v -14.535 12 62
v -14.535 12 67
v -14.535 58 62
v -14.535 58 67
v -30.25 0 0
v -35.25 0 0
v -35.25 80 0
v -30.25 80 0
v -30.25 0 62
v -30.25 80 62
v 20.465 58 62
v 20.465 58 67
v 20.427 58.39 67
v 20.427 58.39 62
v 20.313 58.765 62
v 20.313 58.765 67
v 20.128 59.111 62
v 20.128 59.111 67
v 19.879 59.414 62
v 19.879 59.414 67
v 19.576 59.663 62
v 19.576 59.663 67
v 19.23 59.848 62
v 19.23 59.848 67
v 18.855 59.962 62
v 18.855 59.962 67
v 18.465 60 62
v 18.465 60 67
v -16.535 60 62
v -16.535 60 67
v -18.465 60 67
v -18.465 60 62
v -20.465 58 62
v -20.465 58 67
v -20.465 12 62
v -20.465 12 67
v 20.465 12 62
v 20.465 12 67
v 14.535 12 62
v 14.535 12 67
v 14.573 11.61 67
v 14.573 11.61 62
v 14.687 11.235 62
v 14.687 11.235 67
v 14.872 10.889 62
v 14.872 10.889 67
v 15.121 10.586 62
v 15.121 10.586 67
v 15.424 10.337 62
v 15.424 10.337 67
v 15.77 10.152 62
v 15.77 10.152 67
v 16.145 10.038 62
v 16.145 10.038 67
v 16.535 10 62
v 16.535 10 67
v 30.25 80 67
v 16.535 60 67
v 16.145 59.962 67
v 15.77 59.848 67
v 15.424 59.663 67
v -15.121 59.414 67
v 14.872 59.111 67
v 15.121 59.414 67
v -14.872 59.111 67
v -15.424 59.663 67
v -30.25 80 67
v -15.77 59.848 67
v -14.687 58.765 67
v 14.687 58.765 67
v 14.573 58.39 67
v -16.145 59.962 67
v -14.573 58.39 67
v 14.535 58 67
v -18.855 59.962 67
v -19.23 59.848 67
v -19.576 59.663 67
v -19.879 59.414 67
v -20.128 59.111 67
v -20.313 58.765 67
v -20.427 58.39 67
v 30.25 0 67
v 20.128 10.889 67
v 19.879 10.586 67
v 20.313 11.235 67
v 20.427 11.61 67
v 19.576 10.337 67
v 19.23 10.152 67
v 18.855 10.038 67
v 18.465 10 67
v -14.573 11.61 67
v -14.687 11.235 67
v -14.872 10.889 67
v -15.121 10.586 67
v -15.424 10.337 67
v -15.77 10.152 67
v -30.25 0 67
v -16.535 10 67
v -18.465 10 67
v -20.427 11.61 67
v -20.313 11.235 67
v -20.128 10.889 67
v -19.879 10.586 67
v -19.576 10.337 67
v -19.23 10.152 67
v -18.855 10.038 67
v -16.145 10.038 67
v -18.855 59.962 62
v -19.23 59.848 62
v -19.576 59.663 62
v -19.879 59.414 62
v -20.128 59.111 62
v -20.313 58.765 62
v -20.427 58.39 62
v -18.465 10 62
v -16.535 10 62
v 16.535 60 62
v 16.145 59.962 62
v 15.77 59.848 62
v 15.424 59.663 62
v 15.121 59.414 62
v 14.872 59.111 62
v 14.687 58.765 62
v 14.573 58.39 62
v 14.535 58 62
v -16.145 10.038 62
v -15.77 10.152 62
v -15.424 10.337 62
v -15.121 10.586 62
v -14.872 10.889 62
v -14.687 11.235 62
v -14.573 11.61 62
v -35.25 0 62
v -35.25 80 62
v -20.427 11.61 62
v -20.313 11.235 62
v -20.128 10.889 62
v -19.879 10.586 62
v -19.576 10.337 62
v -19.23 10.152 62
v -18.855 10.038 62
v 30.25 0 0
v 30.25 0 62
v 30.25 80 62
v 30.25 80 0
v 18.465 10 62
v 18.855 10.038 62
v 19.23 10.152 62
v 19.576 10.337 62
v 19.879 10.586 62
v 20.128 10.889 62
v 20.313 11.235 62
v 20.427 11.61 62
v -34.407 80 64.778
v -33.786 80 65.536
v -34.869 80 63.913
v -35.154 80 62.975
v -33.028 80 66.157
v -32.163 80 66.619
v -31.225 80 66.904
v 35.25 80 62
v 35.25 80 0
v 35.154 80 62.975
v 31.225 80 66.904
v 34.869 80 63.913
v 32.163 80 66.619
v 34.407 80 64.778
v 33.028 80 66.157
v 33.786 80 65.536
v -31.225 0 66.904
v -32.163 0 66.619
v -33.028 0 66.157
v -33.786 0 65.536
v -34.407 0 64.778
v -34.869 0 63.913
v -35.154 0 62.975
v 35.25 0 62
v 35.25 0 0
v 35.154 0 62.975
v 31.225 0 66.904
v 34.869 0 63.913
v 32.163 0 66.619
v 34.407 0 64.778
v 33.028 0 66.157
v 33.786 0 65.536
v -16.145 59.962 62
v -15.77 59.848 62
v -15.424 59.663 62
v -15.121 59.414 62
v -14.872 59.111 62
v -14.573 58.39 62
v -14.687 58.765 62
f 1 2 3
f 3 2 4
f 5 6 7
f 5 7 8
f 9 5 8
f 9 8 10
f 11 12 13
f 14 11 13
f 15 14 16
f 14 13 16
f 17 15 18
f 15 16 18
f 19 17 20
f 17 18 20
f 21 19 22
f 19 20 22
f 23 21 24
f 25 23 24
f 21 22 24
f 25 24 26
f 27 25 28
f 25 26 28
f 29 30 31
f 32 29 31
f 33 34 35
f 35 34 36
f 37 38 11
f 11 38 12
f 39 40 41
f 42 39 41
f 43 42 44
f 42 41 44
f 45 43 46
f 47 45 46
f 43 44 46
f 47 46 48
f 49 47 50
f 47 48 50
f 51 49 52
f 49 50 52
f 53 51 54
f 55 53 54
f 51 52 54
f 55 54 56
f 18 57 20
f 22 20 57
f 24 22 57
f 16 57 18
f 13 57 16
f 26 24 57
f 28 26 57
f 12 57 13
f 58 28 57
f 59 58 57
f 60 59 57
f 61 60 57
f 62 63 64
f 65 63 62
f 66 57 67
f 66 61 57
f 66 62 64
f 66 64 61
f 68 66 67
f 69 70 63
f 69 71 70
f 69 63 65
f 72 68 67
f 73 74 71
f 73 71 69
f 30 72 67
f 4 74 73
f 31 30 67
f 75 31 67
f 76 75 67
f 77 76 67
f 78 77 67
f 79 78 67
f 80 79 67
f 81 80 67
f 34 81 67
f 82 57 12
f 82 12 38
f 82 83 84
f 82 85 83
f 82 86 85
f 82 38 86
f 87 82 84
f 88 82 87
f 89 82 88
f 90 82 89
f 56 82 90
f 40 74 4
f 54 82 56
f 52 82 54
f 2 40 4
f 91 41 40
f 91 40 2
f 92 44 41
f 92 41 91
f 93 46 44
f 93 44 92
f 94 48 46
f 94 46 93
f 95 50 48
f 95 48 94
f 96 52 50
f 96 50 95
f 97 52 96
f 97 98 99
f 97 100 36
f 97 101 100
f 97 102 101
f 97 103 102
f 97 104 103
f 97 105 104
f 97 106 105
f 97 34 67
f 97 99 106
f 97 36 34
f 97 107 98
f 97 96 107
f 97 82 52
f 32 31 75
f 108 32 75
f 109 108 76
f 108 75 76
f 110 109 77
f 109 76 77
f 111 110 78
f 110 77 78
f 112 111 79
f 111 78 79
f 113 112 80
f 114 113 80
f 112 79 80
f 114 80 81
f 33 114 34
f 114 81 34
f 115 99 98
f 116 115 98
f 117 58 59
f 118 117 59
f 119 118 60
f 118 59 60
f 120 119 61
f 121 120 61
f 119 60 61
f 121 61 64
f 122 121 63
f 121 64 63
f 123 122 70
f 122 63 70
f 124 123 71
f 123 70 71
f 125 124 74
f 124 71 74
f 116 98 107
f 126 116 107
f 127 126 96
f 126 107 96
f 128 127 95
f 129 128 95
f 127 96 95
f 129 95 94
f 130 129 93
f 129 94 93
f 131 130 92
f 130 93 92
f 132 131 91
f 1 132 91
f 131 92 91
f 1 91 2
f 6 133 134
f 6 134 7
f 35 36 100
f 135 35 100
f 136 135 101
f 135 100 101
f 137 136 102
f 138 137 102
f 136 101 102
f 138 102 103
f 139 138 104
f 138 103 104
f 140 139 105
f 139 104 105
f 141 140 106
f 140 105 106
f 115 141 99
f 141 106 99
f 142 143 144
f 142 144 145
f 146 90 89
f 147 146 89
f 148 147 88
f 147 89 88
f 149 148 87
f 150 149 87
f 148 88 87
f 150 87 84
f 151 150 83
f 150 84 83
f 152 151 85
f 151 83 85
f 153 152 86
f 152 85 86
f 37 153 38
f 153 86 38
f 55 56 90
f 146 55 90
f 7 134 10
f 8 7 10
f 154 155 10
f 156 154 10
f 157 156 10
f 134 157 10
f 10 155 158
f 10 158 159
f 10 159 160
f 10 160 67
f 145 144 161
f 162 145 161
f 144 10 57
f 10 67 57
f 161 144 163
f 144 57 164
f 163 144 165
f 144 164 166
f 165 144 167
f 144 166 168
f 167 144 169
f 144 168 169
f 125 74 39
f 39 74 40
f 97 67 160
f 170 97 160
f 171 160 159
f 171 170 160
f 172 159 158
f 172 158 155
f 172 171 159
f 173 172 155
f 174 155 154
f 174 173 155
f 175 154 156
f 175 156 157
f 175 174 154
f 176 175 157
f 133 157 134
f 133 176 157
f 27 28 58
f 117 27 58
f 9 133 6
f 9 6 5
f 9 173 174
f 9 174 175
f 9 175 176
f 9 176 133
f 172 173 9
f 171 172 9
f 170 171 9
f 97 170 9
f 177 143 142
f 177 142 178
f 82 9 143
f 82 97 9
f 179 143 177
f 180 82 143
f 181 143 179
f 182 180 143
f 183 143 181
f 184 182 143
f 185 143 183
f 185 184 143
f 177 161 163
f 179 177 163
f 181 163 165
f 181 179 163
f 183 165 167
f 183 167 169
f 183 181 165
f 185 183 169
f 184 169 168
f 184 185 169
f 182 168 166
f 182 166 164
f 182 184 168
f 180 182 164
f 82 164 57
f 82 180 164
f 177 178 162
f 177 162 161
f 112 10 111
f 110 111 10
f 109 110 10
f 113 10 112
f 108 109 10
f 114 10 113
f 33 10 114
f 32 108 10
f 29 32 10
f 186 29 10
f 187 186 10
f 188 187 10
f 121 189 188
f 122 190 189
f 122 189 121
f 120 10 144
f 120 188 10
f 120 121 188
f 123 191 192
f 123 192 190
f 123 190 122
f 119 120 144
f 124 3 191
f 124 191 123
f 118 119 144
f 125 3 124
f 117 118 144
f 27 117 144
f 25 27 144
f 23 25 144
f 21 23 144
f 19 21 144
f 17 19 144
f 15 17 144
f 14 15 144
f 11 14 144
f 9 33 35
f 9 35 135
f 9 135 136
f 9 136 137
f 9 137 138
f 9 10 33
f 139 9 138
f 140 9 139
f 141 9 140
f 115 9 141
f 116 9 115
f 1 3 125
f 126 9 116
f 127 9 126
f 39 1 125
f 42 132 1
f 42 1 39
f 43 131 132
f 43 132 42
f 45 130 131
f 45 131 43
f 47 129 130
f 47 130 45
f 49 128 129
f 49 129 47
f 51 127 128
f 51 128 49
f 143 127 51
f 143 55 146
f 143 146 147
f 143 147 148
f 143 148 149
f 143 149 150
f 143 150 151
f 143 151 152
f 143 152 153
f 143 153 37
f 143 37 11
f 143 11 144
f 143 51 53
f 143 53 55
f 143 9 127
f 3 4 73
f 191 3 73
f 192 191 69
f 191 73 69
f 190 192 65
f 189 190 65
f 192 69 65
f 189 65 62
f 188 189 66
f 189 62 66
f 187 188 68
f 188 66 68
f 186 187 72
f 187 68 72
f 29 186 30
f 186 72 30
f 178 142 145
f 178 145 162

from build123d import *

# Parameters (mm, degrees)
F1_DEPTH = 80
F3_DEPTH = 67.001


with BuildPart() as f1:
    # F0 (on Front) → F1 (new body)
    with BuildSketch(Plane.XZ):
        with BuildLine():
            Line((-35.25, 62), (-35.25, 0))
            Line((-35.25, 0), (-30.25, 0))
            Line((-30.25, 0), (-30.25, 62))
            Line((-30.25, 62), (30.25, 62))
            Line((30.25, 62), (30.25, 0))
            Line((30.25, 0), (35.25, 0))
            Line((35.25, 0), (35.25, 62))
            ThreePointArc((35.25, 62), (33.785534, 65.535534), (30.25, 67))
            Line((30.25, 67), (-30.25, 67))
            ThreePointArc((-30.25, 67), (-33.785534, 65.535534), (-35.25, 62))
        make_face()
    extrude(amount=-F1_DEPTH)

    # F2 (on face) → F3 (cut, through all)
    with BuildSketch(Plane.XY.offset(67)):
        with BuildLine():
            Line((16.534872, 10), (18.465128, 10))
            ThreePointArc((18.465128, 10), (19.879342, 10.585786), (20.465128, 12))
            Line((20.465128, 12), (20.465128, 58))
            ThreePointArc((20.465128, 58), (19.879342, 59.414214), (18.465128, 60))
            Line((18.465128, 60), (16.534872, 60))
            ThreePointArc((16.534872, 60), (15.120658, 59.414214), (14.534872, 58))
            Line((14.534872, 58), (14.534872, 12))
            ThreePointArc((14.534872, 12), (15.120658, 10.585786), (16.534872, 10))
        make_face()
        with BuildLine():
            Line((-18.465128, 10), (-16.534872, 10))
            ThreePointArc((-16.534872, 10), (-15.120658, 10.585786), (-14.534872, 12))
            Line((-14.534872, 12), (-14.534872, 58))
            ThreePointArc((-14.534872, 58), (-15.120658, 59.414214), (-16.534872, 60))
            Line((-16.534872, 60), (-18.465128, 60))
            ThreePointArc((-18.465128, 60), (-19.879342, 59.414214), (-20.465128, 58))
            Line((-20.465128, 58), (-20.465128, 12))
            ThreePointArc((-20.465128, 12), (-19.879342, 10.585786), (-18.465128, 10))
        make_face()
    extrude(amount=-F3_DEPTH, mode=Mode.SUBTRACT)


solid = f1.part
